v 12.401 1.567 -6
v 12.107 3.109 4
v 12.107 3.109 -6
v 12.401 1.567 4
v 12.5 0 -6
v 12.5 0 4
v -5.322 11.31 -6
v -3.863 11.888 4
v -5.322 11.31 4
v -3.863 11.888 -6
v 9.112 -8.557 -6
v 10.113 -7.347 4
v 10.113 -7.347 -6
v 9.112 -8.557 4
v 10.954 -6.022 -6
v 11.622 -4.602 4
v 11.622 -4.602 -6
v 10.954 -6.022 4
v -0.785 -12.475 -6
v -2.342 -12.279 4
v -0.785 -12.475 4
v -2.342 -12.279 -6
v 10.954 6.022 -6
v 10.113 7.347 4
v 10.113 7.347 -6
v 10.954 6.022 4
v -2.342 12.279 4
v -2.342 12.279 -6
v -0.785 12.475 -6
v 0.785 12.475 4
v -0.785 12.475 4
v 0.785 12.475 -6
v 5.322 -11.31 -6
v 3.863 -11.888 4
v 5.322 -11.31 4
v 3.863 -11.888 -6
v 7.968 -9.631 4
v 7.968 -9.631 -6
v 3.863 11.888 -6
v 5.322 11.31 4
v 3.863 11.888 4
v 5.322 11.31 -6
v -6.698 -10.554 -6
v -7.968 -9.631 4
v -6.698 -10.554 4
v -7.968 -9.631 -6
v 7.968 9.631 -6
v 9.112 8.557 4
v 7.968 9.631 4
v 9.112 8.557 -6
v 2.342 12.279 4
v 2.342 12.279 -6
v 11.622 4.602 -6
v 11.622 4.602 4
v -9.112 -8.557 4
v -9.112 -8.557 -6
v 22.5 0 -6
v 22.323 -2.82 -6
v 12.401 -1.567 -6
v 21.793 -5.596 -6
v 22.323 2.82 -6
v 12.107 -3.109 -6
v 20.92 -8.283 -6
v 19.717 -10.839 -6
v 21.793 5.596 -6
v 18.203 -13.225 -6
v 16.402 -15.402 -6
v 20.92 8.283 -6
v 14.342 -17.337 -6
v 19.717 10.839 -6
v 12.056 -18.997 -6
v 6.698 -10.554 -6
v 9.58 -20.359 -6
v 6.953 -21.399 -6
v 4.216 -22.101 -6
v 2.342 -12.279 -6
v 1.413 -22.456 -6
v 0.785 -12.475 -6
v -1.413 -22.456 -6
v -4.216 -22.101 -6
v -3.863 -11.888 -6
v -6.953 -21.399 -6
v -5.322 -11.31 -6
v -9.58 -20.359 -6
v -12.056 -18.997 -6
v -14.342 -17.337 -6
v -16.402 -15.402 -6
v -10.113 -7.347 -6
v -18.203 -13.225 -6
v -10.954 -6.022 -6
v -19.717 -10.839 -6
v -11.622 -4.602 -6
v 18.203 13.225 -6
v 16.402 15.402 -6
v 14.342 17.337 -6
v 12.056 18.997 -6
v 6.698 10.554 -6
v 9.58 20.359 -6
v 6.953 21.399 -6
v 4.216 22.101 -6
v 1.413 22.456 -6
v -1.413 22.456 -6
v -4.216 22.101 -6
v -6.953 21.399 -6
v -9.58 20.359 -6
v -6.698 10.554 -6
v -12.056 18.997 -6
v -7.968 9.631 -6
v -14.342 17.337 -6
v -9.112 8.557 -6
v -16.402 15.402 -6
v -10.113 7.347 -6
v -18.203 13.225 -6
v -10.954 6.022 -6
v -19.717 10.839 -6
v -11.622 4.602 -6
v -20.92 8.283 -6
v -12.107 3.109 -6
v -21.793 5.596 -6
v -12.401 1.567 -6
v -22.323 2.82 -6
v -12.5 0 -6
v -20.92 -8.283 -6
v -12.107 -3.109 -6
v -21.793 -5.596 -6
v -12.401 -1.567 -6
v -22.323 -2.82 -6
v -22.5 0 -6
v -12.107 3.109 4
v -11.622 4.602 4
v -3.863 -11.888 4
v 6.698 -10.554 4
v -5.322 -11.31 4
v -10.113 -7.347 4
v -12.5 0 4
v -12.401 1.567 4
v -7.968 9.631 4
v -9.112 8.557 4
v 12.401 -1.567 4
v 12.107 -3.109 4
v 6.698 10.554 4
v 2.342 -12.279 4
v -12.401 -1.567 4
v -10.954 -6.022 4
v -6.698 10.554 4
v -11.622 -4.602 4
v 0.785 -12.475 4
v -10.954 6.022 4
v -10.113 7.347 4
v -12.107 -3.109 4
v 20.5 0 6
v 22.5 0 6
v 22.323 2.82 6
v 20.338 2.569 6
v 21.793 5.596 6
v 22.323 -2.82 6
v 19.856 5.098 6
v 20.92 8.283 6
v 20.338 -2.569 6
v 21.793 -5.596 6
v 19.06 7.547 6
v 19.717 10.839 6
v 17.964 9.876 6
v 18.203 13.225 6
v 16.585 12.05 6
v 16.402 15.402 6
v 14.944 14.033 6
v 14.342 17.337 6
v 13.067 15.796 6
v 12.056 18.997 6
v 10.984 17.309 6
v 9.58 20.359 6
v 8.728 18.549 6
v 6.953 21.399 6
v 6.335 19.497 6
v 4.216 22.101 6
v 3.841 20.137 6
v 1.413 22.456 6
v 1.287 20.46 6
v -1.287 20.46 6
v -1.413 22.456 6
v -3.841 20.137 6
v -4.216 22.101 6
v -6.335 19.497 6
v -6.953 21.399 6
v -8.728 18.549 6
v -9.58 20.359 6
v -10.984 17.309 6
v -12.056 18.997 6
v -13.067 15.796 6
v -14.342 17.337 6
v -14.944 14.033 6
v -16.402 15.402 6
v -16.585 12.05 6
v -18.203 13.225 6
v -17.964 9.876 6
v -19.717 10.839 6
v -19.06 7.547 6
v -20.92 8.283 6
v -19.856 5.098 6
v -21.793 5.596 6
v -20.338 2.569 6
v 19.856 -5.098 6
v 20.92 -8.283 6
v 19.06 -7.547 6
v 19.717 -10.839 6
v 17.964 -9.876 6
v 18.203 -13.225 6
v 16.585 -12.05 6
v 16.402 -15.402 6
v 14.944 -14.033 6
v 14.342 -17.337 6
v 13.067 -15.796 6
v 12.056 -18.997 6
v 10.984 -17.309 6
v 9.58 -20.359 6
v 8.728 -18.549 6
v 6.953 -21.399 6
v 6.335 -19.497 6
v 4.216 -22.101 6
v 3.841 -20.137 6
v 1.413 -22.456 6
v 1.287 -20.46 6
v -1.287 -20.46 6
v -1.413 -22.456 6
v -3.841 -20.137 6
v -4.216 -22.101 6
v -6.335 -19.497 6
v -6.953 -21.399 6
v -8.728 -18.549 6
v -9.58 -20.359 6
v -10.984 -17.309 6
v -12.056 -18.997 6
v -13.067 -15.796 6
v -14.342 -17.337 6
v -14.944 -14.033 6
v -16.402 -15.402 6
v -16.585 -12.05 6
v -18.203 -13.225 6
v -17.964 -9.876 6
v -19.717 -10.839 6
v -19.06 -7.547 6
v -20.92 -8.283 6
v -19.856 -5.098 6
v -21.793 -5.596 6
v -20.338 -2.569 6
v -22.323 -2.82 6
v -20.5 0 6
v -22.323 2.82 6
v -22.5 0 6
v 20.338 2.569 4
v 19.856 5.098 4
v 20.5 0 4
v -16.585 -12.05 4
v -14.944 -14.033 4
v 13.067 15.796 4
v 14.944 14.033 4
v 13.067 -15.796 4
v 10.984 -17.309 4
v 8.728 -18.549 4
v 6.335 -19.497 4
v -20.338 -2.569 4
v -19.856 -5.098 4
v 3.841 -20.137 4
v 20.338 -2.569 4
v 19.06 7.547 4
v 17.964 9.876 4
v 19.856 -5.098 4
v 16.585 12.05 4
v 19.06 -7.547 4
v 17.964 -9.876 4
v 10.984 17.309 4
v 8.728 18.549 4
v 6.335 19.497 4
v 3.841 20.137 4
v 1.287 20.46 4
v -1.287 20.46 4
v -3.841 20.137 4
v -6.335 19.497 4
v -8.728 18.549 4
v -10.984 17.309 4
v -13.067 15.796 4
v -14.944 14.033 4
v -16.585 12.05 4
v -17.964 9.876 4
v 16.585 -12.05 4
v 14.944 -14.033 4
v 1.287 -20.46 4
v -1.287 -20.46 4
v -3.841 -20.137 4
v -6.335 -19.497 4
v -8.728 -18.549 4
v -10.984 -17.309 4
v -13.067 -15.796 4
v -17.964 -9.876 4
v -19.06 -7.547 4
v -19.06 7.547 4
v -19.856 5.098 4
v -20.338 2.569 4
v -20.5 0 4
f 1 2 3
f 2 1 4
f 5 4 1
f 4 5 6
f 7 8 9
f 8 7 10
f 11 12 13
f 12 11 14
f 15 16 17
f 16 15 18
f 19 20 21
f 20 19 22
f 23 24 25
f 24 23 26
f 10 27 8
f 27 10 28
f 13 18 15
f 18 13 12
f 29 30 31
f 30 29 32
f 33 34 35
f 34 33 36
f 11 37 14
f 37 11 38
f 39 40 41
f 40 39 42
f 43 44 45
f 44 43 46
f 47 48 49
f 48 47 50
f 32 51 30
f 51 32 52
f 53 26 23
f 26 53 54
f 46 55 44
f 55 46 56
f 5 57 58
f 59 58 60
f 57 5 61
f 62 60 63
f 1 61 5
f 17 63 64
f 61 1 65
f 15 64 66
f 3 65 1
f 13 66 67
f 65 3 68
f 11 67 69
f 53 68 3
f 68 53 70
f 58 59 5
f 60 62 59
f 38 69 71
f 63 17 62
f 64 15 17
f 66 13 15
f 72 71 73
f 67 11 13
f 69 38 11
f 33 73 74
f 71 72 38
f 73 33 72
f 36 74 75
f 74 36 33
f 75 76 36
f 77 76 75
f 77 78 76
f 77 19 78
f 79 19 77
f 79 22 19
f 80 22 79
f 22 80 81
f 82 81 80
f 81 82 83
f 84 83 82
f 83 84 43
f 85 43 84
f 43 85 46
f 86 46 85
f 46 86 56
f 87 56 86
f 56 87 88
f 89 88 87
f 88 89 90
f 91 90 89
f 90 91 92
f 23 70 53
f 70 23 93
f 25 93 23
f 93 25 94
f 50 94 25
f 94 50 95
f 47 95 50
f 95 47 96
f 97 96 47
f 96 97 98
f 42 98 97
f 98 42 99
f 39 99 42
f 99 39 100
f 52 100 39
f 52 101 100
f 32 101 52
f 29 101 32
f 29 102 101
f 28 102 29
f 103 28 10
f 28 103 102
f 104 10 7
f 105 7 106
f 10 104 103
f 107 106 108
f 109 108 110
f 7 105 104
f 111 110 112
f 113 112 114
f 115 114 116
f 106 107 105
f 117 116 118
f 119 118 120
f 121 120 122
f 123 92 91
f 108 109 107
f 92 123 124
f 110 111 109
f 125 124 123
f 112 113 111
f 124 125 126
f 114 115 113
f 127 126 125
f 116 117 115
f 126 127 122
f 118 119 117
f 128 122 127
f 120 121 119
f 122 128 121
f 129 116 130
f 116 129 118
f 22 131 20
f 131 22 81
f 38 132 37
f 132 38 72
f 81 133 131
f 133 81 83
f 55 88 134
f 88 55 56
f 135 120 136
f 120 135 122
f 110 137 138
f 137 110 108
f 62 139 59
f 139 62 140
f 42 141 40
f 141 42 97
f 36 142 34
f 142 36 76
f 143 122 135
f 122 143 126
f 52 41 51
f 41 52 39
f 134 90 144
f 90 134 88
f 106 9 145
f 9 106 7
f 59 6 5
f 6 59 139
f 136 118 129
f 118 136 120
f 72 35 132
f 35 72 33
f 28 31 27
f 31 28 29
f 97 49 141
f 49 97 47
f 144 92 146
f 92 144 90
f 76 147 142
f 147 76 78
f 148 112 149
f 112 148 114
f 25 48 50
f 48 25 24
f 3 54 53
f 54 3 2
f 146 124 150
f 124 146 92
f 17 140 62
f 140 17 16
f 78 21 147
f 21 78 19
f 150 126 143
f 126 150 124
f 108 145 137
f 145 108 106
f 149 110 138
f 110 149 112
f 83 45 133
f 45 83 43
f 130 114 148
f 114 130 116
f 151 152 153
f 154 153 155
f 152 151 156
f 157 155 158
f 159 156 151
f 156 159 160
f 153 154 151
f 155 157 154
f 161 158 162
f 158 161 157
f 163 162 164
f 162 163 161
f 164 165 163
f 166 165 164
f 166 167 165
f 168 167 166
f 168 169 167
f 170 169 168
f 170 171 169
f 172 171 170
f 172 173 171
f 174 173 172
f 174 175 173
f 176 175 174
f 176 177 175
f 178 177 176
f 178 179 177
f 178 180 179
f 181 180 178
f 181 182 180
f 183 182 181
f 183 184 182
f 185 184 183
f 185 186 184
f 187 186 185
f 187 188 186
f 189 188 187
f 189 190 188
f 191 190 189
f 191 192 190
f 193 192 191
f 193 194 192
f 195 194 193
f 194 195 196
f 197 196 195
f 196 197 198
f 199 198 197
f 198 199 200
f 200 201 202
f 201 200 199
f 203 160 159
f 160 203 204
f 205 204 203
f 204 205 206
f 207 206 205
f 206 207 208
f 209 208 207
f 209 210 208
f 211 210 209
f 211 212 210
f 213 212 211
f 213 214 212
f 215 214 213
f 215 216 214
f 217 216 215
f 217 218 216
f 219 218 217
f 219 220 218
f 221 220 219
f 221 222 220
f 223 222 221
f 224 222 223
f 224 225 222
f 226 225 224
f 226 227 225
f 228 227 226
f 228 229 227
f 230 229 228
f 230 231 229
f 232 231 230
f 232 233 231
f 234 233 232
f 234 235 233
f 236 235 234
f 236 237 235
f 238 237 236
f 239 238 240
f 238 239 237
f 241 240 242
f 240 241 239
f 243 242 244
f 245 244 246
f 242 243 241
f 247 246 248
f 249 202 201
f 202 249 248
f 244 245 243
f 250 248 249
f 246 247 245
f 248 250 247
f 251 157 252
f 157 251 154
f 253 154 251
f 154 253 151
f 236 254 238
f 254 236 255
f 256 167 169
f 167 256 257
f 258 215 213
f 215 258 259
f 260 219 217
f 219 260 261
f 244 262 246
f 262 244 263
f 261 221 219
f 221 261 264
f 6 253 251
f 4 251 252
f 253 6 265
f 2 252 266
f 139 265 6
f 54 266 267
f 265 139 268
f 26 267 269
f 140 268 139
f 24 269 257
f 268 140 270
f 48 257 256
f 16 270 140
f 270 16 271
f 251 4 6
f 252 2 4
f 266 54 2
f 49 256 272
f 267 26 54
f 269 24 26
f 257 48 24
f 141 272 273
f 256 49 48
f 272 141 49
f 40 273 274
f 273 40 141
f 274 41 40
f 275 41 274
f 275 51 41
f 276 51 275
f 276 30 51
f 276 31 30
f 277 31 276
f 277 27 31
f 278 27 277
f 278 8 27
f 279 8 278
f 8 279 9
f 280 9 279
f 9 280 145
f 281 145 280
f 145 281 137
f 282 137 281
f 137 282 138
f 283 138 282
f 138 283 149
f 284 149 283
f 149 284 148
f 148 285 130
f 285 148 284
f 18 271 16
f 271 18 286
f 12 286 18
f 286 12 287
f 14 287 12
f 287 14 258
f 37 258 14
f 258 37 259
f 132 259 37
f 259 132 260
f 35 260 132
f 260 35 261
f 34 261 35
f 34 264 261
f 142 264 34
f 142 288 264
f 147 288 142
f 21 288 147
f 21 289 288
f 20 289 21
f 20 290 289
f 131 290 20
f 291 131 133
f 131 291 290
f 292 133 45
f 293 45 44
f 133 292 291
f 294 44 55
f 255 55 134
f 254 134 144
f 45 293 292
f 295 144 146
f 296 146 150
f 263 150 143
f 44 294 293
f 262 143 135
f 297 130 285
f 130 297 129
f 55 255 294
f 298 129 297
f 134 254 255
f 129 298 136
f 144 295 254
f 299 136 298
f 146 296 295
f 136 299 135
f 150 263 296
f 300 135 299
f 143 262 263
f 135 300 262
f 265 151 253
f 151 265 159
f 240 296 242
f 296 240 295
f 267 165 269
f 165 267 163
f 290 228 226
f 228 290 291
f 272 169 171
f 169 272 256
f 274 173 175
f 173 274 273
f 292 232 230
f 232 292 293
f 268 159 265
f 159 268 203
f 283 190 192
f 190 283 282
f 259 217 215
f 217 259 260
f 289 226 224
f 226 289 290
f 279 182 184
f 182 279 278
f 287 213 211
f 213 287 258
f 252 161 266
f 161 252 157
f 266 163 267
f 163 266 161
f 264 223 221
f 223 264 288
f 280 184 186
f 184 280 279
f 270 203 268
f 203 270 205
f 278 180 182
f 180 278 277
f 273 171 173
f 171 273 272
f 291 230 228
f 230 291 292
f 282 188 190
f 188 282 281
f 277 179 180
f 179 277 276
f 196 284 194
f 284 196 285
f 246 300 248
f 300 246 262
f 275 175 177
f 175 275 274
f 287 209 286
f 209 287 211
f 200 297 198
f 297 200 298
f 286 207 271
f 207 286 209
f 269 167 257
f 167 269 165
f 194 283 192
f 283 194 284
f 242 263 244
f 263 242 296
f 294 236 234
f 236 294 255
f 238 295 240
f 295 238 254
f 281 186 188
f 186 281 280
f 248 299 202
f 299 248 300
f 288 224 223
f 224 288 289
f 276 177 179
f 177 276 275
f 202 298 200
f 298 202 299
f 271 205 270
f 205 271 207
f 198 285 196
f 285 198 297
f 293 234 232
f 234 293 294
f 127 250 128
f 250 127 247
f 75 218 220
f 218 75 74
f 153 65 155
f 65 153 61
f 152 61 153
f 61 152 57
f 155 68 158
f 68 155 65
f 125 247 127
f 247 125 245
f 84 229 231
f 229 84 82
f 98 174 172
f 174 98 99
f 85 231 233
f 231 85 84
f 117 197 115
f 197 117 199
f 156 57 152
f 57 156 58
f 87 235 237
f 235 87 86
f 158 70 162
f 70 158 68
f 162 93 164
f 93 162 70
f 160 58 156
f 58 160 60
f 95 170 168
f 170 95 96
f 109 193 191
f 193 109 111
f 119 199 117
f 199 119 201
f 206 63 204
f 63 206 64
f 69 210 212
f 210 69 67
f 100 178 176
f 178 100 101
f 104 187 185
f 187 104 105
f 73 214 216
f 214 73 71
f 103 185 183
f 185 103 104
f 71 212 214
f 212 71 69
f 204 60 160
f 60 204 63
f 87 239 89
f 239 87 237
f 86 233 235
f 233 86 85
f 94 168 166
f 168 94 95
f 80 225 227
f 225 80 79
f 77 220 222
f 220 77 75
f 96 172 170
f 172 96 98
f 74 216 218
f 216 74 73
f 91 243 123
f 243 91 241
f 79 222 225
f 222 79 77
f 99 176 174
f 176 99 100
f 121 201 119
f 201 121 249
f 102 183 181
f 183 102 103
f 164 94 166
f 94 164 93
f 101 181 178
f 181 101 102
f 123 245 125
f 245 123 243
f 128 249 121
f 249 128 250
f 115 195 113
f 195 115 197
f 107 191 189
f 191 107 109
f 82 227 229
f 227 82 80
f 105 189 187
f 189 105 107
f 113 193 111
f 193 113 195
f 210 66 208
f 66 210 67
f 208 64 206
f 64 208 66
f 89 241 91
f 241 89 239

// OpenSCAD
$fn = 50;


difference() {
	union() {
		translate(v = [0, 0, -6.0000000000]) {
			cylinder(h = 12, r = 22.5000000000);
		}
	}
	union() {
		#translate(v = [0, 0, -6.0000000000]) {
			cylinder(h = 12, r = 12.5000000000);
		}
		translate(v = [0, 0, 4.0000000000]) {
			cylinder(h = 2, r = 20.5000000000);
		}
	}
}
